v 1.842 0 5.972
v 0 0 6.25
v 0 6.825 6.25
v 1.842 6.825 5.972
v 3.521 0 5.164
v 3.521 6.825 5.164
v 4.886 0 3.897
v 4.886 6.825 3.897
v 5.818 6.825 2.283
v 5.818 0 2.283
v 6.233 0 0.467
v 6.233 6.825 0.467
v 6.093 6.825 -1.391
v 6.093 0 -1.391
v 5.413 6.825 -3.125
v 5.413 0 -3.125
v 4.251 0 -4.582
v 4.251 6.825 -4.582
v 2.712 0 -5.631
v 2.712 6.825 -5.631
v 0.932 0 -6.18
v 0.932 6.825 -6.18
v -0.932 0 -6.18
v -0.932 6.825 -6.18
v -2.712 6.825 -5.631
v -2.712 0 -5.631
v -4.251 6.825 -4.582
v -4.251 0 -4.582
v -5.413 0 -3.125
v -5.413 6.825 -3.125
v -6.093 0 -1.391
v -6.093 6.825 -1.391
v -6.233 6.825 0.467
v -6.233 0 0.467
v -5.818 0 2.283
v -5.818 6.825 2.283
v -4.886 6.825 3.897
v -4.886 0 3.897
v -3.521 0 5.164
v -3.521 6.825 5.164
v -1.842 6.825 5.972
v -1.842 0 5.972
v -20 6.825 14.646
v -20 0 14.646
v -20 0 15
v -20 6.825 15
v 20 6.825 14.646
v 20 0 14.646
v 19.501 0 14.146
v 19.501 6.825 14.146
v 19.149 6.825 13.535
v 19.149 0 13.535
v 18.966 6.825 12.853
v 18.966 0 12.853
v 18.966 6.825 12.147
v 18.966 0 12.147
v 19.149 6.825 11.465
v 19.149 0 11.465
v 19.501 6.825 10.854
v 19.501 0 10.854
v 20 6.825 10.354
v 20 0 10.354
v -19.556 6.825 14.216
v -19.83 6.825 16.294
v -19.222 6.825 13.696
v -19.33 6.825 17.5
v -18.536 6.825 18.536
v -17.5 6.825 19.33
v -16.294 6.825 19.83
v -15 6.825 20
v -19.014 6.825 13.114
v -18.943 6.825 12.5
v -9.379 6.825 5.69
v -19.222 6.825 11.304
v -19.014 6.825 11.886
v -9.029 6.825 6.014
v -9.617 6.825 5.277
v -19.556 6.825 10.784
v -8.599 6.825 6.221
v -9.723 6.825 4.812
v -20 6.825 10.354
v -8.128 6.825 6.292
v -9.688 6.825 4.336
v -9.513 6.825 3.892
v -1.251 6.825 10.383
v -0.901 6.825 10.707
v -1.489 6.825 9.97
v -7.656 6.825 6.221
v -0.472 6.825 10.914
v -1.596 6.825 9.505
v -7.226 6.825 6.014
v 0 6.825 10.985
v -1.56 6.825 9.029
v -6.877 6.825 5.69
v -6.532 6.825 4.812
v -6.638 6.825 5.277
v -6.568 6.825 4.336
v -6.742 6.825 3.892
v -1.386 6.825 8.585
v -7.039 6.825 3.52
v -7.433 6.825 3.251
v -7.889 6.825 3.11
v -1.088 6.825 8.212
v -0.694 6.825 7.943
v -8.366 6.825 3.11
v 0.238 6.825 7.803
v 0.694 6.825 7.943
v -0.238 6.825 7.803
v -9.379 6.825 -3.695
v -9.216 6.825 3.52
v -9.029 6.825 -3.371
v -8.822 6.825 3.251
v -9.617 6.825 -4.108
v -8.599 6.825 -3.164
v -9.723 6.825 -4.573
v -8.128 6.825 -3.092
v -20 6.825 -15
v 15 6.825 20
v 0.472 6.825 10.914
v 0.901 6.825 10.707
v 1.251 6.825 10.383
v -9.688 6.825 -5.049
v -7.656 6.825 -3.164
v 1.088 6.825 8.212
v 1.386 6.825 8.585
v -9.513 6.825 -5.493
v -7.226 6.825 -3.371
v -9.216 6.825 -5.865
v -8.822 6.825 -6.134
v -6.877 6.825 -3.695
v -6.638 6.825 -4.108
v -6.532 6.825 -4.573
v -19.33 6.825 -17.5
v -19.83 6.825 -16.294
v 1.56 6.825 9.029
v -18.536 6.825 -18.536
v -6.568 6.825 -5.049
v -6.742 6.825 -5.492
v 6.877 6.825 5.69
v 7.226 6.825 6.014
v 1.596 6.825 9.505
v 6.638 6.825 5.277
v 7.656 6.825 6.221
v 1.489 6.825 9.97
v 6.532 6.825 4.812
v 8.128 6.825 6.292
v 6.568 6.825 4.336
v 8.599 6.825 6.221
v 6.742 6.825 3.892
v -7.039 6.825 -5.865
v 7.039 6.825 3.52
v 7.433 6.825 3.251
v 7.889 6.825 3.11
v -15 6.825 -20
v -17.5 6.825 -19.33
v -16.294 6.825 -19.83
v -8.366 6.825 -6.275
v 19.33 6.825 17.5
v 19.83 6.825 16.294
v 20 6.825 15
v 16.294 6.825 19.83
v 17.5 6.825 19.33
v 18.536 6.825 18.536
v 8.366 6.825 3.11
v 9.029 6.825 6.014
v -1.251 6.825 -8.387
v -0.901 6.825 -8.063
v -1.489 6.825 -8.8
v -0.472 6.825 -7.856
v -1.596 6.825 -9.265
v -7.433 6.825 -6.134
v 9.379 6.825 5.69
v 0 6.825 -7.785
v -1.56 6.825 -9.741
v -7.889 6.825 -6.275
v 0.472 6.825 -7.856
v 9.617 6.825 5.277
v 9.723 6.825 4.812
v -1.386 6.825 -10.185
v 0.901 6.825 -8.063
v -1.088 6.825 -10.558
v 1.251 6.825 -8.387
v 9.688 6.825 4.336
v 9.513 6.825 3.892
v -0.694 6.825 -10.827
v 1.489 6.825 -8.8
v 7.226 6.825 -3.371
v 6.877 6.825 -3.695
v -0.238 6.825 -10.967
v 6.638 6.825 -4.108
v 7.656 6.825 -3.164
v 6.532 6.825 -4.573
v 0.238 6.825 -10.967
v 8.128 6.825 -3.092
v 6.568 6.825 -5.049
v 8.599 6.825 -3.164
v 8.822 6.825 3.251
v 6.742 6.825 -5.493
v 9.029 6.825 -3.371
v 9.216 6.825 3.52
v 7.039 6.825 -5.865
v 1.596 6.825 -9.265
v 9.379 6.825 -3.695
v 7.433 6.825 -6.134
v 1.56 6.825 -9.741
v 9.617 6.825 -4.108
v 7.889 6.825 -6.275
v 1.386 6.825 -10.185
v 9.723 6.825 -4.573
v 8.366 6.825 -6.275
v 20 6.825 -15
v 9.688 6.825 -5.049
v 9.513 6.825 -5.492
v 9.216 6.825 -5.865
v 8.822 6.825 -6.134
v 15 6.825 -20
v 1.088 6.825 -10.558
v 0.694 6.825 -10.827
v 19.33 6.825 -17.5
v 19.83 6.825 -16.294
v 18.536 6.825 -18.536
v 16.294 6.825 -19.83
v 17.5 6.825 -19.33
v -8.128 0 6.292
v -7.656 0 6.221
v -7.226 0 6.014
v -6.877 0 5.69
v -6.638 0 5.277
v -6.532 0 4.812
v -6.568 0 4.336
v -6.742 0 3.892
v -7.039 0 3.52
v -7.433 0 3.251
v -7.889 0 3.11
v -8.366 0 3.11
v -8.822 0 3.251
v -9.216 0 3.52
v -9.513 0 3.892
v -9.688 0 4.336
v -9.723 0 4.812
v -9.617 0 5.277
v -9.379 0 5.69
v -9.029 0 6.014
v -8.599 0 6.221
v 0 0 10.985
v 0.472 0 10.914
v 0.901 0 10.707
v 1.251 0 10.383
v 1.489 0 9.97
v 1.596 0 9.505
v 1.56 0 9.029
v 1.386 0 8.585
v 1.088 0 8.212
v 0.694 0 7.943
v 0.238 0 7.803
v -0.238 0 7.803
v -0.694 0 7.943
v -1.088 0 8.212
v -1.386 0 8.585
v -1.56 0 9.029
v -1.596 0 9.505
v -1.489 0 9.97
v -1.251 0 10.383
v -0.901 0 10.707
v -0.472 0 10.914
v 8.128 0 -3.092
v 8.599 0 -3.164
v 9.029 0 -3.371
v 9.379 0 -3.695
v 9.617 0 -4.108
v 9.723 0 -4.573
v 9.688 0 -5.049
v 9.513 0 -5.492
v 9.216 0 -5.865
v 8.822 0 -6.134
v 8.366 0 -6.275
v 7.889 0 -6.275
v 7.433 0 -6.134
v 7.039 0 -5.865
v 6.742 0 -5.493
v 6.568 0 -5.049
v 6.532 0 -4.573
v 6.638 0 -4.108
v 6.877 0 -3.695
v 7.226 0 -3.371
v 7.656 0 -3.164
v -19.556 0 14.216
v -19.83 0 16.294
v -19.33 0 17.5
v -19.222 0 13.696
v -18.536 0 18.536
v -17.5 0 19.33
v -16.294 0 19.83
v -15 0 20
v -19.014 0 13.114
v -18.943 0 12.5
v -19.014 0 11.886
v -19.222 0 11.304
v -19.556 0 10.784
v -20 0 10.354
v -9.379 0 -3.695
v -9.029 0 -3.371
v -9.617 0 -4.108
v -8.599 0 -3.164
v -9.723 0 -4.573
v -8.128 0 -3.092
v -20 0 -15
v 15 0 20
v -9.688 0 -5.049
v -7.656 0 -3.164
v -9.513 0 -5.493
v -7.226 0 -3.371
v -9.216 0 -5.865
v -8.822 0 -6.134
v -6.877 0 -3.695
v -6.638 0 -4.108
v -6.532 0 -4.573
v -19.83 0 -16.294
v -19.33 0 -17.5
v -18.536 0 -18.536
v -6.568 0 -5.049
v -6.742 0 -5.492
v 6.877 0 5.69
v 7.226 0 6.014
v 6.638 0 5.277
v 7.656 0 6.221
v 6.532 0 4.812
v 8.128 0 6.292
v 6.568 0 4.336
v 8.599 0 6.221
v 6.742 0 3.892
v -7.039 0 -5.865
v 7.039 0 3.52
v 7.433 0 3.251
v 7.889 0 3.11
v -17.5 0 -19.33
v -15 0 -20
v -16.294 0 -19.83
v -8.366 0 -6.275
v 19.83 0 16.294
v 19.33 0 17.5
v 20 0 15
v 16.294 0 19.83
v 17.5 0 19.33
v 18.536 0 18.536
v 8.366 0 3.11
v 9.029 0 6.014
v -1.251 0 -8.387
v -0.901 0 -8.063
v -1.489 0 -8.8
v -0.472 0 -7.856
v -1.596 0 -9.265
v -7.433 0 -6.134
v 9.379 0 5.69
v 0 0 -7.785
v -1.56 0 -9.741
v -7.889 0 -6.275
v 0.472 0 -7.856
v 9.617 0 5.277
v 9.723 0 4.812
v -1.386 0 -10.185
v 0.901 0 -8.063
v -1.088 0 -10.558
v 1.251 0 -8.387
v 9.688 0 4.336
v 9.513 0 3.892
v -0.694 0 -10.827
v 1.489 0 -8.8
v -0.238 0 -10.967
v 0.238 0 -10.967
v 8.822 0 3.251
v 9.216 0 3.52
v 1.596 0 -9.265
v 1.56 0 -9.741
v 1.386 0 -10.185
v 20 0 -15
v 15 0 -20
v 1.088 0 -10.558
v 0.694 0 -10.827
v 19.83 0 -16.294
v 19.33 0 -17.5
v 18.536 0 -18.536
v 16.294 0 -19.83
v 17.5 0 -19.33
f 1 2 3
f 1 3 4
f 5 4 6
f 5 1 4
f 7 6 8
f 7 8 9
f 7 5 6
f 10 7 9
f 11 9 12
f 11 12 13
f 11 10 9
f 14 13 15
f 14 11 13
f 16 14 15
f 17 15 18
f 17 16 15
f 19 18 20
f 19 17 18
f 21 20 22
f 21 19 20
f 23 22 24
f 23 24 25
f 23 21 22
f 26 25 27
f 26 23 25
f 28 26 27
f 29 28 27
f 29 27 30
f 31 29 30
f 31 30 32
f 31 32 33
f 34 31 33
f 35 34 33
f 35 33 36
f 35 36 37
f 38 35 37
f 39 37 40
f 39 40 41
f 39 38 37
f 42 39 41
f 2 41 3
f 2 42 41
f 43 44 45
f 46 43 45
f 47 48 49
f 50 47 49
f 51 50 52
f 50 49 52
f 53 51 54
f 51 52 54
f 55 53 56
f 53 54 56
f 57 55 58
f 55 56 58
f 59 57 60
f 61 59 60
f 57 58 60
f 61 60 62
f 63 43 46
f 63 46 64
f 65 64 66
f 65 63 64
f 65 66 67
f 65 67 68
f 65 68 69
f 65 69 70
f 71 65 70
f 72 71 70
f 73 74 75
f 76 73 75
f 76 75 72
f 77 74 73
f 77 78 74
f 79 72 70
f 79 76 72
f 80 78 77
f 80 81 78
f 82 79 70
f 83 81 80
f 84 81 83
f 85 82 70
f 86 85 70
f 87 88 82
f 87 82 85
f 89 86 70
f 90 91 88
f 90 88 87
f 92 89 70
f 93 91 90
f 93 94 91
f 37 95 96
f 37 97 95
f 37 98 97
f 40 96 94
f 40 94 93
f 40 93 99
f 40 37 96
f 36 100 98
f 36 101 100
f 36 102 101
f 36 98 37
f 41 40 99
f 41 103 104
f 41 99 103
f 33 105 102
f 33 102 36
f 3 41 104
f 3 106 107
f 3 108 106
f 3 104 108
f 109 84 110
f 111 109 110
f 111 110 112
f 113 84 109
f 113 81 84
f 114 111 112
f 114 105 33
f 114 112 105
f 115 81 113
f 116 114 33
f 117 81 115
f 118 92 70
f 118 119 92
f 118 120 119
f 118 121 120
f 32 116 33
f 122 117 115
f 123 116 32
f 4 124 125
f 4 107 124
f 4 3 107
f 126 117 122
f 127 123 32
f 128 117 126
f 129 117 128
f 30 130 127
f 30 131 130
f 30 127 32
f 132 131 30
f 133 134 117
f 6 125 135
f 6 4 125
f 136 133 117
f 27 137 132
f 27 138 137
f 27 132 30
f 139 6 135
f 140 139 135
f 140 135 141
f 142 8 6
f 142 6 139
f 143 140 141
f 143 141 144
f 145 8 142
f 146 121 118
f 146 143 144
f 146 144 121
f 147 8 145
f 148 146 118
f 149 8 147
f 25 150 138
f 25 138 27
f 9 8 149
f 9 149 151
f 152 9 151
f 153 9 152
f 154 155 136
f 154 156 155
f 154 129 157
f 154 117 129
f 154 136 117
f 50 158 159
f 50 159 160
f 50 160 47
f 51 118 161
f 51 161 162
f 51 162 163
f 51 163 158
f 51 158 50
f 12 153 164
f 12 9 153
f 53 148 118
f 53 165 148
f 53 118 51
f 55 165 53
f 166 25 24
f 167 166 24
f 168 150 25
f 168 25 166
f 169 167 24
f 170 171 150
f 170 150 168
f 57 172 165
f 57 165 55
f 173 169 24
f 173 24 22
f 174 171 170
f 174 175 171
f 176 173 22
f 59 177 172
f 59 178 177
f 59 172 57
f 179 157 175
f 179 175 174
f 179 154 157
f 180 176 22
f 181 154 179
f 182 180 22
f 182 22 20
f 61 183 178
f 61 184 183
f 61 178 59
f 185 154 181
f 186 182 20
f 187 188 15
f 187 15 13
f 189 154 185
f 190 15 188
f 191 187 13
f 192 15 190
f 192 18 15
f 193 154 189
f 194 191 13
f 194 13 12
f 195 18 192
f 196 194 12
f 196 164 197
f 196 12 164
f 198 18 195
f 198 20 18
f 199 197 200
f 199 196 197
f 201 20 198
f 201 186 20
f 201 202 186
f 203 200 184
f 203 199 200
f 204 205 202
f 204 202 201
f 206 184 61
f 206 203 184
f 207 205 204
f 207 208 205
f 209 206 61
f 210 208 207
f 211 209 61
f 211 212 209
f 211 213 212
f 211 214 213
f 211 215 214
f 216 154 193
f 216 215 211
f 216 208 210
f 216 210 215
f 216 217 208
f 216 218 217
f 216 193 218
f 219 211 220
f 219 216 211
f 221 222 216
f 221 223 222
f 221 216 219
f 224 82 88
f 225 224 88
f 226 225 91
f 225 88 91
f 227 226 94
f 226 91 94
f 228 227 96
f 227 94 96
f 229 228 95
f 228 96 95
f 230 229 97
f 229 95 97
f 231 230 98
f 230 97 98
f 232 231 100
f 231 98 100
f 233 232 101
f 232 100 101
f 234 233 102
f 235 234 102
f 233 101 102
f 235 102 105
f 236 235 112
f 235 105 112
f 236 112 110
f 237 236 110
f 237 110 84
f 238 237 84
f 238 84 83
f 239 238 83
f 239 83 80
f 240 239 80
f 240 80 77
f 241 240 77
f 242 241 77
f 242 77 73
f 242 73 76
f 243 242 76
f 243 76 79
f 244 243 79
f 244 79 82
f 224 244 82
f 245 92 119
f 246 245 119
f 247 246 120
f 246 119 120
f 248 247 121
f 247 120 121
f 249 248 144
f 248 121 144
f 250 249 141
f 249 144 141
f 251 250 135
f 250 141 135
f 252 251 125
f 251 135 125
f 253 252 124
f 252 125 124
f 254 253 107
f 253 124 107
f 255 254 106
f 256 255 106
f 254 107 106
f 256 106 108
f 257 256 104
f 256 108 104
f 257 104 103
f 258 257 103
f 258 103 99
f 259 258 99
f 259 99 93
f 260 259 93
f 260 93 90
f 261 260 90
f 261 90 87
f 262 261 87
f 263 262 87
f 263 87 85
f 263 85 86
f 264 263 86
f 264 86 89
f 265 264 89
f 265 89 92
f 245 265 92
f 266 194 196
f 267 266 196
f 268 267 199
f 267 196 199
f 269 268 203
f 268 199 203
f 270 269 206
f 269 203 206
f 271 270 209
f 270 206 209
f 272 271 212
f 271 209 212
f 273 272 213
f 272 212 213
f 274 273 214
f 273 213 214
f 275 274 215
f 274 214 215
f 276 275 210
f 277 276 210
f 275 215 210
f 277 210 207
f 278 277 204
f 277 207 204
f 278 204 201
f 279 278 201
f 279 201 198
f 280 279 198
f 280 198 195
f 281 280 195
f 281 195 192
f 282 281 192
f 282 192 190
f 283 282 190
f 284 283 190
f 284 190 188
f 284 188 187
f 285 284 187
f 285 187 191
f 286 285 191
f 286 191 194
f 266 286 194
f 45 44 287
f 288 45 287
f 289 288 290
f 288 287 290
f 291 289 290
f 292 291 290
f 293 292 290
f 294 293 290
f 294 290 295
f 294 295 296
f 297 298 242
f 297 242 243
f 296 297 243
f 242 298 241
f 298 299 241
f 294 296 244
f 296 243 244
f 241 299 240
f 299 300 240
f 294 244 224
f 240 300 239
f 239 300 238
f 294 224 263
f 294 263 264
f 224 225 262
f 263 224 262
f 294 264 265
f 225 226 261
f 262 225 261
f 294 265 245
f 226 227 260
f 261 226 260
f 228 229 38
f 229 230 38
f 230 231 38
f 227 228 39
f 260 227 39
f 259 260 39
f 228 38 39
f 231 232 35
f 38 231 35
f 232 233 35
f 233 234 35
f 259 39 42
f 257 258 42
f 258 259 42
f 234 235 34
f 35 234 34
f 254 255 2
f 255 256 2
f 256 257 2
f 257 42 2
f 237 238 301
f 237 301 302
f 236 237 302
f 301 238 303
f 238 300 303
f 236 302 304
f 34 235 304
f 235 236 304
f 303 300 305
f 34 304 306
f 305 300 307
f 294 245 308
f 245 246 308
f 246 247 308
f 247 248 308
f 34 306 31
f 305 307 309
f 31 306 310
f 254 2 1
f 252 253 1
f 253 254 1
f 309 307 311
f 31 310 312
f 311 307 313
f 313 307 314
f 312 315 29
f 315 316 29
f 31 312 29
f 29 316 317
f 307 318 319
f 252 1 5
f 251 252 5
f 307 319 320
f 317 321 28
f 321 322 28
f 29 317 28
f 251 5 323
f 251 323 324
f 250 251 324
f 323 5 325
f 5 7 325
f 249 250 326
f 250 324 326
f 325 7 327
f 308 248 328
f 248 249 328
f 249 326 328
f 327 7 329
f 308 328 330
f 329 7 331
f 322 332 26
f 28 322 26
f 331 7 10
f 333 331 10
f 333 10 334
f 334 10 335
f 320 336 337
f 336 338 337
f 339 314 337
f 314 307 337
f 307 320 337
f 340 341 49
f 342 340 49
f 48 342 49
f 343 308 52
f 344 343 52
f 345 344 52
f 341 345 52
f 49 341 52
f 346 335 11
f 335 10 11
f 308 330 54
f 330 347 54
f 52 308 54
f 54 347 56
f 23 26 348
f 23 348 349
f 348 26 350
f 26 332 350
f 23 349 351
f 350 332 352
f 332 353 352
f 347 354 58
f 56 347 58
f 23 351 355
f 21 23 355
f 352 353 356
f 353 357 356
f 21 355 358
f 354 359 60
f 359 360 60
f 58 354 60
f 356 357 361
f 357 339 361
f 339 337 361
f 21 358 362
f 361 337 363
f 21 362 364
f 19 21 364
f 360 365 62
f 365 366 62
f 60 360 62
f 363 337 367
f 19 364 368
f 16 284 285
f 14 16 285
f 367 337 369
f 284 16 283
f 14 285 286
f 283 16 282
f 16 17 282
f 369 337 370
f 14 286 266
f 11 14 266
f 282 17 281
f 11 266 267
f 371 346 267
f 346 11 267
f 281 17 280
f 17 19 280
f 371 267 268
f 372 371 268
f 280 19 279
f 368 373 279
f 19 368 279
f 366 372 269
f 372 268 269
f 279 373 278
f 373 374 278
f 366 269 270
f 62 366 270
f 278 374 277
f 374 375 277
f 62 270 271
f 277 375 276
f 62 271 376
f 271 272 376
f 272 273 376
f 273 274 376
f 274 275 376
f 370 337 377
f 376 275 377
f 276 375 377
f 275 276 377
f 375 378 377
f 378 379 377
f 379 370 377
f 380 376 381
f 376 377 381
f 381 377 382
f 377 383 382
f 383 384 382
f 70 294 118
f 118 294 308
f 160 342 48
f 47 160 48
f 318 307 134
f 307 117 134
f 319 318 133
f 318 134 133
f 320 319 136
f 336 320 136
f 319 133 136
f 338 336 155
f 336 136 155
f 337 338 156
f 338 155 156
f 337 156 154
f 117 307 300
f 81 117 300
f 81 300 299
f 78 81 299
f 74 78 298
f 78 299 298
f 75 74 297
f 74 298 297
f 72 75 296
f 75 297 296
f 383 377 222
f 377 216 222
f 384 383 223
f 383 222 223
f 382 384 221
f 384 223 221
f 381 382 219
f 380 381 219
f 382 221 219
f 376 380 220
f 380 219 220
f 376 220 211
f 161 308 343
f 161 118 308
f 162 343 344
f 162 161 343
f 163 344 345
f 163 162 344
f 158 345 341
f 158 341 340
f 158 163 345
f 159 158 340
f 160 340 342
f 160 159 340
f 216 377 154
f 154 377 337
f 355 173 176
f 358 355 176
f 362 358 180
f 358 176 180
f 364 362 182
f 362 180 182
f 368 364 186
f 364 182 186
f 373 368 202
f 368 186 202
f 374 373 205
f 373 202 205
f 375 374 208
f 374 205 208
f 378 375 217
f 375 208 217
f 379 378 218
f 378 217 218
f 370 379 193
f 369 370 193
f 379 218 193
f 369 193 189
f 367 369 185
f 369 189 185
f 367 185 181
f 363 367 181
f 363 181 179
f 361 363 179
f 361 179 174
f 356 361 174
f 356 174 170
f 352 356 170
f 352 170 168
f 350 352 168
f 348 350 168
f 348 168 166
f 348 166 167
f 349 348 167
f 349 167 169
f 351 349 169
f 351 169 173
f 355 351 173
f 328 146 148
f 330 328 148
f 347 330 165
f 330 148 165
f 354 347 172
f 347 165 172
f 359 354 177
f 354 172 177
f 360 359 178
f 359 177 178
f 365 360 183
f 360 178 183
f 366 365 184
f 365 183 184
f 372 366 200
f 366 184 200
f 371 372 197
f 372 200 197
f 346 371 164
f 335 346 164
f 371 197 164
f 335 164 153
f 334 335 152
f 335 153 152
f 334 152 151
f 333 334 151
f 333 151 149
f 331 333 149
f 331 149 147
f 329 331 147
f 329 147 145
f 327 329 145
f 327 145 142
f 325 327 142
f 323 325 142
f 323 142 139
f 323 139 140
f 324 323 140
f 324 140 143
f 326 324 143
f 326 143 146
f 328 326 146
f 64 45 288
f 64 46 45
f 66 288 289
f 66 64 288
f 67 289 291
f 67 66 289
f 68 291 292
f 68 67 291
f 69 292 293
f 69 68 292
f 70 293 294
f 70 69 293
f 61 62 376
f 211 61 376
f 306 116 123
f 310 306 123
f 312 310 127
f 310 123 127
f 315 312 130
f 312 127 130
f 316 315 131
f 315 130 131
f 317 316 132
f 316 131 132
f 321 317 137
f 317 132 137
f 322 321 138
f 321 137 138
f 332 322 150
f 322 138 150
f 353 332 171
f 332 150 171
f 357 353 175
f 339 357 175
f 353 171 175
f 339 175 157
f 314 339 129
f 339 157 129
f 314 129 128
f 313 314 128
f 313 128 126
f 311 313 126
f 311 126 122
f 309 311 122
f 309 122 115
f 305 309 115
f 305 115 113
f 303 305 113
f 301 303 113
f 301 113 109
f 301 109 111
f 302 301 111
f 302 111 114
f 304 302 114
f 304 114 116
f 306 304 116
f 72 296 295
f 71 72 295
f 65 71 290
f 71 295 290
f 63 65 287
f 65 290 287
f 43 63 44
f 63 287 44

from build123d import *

# Parameters (mm, degrees)
SKETCH1_R           = 6.25
BOSS_EXTRUDE1_DEPTH = 6.825
SKETCH6_R           = 1.6
CUT_EXTRUDE1_DEPTH  = 30.096058582
FILLET2_R           = 5


with BuildPart() as part:
    # Sketch1 → Boss-Extrude1 (new body)
    with BuildSketch(Plane(origin=(0, 0, 0), x_dir=(1, 0, 0), z_dir=(0, 1, 0))):
        with BuildLine():
            Line((-20, -14.645854519), (-20, -20))
            Line((-20, -20), (20, -20))
            Line((20, -20), (20, -14.645854519))
            ThreePointArc((20, -14.645854519), (18.943369346, -12.5), (20, -10.354145481))
            Line((20, -10.354145481), (20, 20))
            Line((20, 20), (-20, 20))
            Line((-20, 20), (-20, -10.354145481))
            ThreePointArc((-20, -10.354145481), (-19.221849833, -11.304052681), (-18.943369346, -12.5))
            ThreePointArc((-18.943369346, -12.5), (-19.221849833, -13.695947319), (-20, -14.645854519))
        make_face()
        Circle(SKETCH1_R, mode=Mode.SUBTRACT)
    extrude(amount=BOSS_EXTRUDE1_DEPTH)

    # Sketch6 → Cut-Extrude1 (cut, through all)
    with BuildSketch(Plane(origin=(0, 6.825, 0), x_dir=(1, 0, 0), z_dir=(0, 1, 0))):
        with Locations((0, -9.385)):
            Circle(SKETCH6_R)
        with Locations((-8.127648415, -4.6925)):
            Circle(SKETCH6_R)
        with Locations((-8.127648415, 4.6925)):
            Circle(SKETCH6_R)
        with Locations((0, 9.385)):
            Circle(SKETCH6_R)
        with Locations((8.127648415, 4.6925)):
            Circle(SKETCH6_R)
        with Locations((8.127648415, -4.6925)):
            Circle(SKETCH6_R)
    extrude(amount=-CUT_EXTRUDE1_DEPTH, mode=Mode.SUBTRACT)

    # Fillet2
    fillet2_edges = [part.edges().sort_by_distance(p)[0] for p in [
        (20, 3.4125, 20),
        (20, 3.4125, -20),
        (-20, 3.4125, -20),
        (-20, 3.4125, 20),
    ]]
    fillet(fillet2_edges, radius=FILLET2_R)


solid = part.part
